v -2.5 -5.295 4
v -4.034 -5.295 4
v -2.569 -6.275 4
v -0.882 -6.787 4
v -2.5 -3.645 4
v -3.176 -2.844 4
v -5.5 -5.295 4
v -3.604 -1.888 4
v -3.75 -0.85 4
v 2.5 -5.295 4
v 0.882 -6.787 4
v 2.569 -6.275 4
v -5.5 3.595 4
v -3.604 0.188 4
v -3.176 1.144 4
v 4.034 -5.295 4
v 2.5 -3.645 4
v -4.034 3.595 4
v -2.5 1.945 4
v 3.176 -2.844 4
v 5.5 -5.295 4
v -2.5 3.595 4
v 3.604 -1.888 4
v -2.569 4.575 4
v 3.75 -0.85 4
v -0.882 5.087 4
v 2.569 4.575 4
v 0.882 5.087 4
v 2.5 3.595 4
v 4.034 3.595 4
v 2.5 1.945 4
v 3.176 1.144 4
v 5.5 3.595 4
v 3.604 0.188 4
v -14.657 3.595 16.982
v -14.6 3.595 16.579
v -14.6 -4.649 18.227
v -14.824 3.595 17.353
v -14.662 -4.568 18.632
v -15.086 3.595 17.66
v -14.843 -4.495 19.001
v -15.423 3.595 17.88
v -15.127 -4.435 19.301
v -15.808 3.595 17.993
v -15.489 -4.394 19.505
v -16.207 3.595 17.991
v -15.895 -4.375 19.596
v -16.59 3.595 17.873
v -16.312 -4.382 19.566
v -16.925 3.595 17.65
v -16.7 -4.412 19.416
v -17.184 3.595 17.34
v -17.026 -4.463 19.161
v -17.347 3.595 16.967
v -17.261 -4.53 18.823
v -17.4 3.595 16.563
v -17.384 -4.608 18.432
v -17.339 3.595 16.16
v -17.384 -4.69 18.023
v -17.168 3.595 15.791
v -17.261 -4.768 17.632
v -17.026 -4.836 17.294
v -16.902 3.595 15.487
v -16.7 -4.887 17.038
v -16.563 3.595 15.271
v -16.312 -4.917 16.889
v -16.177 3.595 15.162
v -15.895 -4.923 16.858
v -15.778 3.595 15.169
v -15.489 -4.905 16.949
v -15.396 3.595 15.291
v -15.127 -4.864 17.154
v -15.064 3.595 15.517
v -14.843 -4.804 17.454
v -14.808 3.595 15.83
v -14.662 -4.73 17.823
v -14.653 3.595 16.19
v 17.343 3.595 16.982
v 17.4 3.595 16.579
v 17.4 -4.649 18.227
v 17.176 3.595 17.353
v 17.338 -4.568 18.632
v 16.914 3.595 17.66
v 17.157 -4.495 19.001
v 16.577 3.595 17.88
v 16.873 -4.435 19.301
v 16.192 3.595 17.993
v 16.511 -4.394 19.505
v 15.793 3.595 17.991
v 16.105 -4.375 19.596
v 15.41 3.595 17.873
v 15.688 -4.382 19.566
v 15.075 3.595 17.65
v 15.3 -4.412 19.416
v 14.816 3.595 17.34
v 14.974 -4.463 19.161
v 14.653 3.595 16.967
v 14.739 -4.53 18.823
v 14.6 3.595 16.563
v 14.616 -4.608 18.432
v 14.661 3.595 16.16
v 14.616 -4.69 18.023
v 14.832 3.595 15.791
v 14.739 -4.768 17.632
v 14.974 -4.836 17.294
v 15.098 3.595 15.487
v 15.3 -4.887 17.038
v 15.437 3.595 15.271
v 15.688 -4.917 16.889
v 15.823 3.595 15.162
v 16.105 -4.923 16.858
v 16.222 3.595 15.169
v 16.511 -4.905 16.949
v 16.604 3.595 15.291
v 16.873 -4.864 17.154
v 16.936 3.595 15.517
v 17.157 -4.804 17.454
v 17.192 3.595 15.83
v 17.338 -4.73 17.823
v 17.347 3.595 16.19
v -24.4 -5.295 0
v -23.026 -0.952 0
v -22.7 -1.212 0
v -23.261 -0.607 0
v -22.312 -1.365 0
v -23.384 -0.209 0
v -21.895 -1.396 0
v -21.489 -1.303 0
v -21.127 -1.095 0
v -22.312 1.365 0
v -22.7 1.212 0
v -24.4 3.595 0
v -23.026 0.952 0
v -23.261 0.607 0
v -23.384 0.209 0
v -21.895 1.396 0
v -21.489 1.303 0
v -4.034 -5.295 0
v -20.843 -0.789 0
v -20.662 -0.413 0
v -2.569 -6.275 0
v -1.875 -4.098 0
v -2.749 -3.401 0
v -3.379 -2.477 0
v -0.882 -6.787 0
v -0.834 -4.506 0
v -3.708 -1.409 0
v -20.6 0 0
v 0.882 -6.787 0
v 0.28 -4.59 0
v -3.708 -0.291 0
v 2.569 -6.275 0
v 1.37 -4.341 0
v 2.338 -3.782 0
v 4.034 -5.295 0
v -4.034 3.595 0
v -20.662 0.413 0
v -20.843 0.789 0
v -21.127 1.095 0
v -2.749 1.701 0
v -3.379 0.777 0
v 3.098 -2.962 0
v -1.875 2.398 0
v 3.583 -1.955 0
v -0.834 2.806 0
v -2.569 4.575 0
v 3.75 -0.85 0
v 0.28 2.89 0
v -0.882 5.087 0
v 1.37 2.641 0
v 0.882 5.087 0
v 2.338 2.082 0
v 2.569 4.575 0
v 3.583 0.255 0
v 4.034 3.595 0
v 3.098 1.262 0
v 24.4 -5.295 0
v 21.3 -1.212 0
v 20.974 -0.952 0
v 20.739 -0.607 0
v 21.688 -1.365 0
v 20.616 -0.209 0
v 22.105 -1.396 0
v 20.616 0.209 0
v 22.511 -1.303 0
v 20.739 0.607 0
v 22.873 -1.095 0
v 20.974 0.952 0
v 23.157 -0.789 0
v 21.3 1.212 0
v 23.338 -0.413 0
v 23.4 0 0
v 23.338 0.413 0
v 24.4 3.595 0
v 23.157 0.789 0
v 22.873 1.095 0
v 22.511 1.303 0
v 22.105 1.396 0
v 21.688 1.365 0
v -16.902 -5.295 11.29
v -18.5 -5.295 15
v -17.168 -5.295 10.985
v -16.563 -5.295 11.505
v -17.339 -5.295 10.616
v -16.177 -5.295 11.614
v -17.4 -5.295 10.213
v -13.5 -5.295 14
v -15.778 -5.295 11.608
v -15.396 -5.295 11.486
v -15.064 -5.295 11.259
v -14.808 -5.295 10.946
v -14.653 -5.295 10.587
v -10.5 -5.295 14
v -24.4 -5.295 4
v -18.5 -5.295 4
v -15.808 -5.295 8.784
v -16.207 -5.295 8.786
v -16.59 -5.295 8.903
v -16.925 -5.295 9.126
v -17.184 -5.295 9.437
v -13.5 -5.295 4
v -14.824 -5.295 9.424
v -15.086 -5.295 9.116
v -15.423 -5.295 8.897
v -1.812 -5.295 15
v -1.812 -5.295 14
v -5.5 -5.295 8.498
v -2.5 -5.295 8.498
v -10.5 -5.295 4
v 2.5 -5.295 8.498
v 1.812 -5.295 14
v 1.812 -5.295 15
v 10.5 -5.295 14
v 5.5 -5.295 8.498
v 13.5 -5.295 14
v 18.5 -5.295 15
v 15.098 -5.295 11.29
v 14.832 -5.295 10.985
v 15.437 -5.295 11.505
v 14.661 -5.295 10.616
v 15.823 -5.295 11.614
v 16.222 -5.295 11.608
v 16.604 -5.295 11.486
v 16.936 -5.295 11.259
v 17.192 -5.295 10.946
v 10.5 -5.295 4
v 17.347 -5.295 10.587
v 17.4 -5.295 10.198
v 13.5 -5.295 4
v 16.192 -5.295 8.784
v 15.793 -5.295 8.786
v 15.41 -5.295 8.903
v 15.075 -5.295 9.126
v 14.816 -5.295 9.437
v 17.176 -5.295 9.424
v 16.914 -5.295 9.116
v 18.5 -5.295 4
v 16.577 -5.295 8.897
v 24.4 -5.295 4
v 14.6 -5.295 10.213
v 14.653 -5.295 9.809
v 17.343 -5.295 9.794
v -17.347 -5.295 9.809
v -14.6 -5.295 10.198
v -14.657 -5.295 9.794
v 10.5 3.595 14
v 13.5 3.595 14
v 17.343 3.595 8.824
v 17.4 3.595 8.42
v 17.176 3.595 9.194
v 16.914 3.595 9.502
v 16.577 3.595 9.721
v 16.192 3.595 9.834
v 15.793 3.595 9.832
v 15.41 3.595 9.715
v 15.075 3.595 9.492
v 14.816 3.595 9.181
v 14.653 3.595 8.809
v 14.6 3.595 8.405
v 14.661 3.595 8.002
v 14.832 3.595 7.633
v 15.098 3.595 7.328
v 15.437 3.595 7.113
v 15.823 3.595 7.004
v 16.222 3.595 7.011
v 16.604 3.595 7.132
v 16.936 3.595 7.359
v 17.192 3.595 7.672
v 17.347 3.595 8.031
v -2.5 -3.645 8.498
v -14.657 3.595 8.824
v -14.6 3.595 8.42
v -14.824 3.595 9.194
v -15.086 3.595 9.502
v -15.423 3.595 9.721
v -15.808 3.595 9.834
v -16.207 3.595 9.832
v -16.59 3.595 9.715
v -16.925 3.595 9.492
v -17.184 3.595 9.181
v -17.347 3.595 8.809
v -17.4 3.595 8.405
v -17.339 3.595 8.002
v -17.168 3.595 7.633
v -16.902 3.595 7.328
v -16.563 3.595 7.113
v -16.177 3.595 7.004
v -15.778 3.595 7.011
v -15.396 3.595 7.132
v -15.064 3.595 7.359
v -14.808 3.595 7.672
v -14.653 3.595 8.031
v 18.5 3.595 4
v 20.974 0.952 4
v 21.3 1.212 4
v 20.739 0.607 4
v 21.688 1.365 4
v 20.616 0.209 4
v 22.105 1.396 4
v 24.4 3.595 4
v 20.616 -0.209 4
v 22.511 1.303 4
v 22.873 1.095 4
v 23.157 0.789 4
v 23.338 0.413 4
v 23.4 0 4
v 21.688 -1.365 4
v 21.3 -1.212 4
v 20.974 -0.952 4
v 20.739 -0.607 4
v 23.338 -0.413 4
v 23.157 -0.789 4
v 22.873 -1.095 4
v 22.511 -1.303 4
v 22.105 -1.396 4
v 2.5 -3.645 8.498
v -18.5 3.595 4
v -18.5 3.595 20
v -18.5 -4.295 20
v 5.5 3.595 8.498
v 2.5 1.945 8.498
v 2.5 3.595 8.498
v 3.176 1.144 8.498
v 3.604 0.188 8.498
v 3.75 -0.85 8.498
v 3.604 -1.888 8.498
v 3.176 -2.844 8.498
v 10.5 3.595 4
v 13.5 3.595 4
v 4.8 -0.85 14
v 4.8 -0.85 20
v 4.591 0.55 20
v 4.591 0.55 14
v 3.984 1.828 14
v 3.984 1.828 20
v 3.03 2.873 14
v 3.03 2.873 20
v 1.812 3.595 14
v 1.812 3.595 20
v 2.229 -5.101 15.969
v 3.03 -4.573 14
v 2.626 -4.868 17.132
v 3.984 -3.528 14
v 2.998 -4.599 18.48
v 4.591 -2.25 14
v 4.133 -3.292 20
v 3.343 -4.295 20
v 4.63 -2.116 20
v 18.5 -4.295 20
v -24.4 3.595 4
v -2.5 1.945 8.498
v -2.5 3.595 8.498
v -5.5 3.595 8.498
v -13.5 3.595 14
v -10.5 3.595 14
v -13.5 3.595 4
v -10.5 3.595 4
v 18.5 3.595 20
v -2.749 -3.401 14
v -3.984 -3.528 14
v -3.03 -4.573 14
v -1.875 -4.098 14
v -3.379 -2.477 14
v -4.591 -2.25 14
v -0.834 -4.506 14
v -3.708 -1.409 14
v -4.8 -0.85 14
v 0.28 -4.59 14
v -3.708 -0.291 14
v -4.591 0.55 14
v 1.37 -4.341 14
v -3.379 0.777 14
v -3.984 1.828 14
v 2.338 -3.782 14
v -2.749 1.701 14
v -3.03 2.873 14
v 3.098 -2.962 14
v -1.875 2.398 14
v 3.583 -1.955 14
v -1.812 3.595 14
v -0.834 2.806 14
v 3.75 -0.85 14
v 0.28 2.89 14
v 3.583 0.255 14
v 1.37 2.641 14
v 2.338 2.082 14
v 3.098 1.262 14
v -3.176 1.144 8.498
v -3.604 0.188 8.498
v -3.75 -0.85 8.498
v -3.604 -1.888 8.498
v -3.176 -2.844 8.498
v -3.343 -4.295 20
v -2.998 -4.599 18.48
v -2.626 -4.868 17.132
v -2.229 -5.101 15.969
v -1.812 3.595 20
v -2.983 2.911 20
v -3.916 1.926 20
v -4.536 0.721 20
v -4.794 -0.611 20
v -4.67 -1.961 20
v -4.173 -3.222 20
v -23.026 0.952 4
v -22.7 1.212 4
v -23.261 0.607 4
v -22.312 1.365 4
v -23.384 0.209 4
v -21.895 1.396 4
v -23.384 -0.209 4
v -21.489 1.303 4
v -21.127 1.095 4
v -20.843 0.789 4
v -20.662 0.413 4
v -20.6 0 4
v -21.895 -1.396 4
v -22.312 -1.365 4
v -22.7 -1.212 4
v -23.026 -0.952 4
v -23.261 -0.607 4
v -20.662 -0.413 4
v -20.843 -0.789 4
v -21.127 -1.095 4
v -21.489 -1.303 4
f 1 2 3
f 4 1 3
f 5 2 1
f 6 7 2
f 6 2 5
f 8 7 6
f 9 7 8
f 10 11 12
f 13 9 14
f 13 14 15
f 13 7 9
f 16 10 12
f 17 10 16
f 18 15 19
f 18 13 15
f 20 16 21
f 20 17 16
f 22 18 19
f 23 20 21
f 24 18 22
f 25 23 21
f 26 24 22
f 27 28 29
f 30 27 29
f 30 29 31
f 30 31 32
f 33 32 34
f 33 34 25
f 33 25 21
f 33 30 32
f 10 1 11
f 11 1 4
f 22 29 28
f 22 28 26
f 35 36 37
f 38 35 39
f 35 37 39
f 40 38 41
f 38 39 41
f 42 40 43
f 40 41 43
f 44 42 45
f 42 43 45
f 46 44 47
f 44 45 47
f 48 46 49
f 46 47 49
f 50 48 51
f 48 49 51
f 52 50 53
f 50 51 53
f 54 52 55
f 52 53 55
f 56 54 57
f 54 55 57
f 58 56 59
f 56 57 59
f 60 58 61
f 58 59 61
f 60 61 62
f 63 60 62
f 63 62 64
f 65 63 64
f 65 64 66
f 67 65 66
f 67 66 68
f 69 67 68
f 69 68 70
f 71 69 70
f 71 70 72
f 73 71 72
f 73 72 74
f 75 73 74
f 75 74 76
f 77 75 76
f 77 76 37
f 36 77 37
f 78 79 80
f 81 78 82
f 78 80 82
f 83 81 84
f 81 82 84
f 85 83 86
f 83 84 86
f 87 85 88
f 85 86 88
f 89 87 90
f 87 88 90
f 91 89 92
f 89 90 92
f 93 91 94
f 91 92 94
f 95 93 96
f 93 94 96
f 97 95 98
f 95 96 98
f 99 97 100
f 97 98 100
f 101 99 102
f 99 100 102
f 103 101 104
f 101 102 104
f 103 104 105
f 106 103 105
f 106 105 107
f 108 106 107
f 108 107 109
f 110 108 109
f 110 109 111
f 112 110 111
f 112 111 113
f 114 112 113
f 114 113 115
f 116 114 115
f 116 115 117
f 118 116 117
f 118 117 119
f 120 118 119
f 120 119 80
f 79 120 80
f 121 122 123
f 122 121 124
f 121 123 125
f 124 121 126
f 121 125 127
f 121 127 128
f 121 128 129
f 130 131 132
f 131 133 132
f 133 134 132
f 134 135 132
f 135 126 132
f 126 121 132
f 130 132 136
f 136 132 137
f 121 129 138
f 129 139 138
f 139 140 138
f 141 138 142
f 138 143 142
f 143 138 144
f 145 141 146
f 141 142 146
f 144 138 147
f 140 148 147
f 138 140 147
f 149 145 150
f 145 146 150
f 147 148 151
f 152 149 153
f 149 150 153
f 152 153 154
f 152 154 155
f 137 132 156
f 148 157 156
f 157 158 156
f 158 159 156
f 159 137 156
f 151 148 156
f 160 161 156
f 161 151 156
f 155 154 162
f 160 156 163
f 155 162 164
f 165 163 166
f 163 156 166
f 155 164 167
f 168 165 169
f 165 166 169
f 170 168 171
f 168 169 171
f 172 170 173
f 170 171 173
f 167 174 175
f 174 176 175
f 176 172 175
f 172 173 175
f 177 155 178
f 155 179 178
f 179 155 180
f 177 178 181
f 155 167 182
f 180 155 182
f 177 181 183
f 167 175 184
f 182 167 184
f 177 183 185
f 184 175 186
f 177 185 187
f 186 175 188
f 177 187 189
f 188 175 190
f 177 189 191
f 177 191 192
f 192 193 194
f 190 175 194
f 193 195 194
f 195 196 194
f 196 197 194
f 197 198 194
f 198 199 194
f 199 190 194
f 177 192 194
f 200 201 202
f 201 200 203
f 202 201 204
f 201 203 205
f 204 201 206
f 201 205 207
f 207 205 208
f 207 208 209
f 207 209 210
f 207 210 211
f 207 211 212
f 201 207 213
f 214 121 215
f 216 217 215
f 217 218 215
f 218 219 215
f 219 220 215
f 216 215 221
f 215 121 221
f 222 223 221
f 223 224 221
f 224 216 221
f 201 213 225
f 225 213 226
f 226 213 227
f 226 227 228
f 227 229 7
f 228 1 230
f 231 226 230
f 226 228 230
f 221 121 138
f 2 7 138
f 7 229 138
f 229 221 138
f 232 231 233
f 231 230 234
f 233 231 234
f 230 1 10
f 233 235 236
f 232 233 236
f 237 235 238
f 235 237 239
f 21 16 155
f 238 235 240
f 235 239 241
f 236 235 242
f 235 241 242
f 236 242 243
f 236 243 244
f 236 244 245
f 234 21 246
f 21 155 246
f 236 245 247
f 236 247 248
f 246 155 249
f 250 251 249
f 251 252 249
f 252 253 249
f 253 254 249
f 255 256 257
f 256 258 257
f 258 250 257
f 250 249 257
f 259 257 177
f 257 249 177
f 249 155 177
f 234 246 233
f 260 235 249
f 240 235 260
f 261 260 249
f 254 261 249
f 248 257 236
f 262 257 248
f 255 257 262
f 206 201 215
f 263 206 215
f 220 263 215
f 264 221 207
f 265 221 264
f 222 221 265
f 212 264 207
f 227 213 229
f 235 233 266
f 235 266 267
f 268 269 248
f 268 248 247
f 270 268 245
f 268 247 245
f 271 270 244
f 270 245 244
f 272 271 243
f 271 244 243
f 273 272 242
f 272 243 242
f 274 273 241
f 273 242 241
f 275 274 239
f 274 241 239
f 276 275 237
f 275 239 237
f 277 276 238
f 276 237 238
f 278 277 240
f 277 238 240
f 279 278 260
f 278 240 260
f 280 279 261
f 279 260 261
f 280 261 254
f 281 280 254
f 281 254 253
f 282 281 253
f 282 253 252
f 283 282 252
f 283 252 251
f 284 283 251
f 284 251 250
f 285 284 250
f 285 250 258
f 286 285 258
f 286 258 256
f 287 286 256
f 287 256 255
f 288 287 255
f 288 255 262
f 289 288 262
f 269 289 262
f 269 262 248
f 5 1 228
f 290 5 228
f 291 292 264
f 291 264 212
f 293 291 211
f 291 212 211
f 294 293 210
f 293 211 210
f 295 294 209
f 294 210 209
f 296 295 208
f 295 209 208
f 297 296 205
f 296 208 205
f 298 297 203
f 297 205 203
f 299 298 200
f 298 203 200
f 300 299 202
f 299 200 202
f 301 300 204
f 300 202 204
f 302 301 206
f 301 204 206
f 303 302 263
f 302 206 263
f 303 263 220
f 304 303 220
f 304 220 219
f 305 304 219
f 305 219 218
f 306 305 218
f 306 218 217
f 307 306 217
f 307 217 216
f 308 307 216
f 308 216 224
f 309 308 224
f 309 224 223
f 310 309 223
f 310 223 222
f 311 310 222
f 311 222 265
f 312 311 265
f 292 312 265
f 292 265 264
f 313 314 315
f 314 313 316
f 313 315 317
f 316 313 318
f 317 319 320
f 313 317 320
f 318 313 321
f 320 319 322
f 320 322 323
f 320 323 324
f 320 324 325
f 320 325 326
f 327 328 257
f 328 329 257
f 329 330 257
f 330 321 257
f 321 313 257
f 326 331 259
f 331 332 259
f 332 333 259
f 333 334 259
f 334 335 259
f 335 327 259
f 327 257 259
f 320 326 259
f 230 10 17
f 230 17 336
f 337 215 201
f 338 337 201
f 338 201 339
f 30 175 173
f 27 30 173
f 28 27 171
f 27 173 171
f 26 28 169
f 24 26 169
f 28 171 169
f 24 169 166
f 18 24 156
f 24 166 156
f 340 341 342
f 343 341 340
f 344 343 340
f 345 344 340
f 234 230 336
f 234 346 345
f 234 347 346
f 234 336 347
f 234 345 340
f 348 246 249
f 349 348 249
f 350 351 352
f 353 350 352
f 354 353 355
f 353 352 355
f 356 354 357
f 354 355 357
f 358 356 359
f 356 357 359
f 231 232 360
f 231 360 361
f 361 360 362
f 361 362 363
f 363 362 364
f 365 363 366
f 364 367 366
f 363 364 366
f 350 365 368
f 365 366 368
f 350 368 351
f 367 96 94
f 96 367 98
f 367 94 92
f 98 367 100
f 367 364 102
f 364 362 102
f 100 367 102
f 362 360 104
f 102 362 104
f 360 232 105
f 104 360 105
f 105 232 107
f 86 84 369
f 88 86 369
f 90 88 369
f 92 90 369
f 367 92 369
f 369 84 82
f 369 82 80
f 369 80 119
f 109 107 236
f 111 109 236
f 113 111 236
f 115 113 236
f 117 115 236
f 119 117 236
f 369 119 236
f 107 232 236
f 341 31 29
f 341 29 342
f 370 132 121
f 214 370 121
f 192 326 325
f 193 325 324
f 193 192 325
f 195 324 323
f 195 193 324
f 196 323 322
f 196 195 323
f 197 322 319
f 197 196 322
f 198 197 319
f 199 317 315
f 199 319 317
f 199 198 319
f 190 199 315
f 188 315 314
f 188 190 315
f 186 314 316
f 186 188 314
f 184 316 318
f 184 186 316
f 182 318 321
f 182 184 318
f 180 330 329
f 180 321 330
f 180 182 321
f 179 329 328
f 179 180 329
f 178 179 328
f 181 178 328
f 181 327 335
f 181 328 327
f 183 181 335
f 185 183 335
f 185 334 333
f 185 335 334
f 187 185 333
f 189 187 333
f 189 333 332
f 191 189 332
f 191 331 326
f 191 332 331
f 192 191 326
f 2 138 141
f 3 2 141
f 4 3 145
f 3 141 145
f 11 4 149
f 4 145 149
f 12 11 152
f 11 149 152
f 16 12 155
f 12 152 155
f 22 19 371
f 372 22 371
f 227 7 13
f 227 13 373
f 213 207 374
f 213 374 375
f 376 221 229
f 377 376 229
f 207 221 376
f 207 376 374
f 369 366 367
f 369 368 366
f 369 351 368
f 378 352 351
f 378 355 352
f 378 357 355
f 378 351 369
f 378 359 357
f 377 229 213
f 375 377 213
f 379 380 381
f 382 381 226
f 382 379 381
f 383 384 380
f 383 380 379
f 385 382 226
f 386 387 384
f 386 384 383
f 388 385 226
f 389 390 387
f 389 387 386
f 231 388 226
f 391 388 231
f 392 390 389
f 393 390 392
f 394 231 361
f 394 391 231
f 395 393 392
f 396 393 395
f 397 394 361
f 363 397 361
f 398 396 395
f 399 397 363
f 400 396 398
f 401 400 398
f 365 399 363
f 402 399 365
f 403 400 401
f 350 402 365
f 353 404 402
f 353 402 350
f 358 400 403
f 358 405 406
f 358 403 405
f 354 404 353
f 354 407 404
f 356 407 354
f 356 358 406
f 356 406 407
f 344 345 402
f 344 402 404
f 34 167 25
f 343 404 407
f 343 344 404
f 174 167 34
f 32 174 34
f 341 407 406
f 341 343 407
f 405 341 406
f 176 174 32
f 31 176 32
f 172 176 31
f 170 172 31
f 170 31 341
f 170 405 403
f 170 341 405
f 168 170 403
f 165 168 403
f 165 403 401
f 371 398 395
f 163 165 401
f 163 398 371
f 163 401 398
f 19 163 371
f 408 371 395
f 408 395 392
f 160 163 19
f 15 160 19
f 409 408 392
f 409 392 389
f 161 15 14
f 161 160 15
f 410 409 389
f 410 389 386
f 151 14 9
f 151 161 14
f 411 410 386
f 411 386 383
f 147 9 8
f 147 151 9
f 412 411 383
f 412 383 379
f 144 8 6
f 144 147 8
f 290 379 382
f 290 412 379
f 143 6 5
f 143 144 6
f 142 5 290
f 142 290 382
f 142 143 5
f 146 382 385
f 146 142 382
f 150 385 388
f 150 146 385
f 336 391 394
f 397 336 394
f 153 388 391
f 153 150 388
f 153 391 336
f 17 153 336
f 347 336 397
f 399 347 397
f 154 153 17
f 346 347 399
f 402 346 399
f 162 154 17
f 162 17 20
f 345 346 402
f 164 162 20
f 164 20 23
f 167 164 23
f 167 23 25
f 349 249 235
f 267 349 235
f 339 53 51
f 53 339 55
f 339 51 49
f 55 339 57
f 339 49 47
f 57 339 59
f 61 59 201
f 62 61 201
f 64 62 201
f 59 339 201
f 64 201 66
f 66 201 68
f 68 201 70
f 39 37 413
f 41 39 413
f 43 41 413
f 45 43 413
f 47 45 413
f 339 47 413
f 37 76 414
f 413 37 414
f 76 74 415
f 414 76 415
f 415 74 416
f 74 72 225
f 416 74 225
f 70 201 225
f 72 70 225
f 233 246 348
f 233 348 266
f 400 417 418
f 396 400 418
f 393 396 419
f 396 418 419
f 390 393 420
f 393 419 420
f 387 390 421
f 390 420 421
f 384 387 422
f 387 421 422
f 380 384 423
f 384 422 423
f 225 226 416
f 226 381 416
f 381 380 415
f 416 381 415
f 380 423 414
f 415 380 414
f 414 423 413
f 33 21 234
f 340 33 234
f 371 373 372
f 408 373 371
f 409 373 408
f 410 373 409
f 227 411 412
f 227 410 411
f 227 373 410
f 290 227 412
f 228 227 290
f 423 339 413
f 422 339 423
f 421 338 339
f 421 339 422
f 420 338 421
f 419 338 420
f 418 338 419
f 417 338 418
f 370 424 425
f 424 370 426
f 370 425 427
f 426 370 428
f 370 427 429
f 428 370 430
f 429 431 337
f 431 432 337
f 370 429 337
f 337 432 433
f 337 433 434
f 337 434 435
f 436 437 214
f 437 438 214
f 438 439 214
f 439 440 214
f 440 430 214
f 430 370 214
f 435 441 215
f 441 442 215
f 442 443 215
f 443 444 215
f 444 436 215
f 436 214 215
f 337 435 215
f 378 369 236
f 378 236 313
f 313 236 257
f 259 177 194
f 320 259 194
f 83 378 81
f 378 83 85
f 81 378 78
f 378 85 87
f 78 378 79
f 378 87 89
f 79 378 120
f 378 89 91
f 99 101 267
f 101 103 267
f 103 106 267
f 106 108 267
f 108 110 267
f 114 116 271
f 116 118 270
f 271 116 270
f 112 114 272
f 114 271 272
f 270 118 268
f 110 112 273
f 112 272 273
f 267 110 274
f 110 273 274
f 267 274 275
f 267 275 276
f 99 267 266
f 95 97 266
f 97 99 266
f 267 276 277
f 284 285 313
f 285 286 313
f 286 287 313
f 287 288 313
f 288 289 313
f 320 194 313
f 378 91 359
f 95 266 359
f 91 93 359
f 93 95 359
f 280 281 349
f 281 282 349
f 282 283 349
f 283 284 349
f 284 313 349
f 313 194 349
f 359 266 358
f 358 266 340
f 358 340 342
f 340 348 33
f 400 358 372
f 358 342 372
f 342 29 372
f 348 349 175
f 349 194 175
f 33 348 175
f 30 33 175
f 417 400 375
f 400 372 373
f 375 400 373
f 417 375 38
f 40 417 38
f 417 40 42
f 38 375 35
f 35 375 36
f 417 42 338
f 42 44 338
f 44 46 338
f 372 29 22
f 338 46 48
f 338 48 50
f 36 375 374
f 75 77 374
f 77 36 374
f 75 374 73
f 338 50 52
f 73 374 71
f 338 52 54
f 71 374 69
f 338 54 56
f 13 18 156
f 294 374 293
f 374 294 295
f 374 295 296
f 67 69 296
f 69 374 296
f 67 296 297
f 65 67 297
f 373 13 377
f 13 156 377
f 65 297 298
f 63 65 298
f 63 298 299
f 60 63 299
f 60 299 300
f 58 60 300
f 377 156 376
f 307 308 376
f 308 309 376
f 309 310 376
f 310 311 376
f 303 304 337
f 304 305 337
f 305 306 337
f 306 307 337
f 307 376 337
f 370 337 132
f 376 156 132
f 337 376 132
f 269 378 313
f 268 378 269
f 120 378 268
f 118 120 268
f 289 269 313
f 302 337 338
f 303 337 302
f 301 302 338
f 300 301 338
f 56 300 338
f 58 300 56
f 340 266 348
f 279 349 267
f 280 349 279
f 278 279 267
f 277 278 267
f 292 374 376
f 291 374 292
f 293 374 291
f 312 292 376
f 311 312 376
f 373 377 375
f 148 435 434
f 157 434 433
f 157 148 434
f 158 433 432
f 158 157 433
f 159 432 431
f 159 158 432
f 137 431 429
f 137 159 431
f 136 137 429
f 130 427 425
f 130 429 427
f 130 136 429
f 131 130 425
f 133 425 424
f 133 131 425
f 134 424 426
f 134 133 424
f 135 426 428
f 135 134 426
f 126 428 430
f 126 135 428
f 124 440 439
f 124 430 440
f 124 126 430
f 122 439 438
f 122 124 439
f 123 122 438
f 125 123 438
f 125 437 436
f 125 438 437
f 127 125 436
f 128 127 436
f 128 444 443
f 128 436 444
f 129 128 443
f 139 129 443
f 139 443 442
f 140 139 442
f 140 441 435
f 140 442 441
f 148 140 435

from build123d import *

# Parameters (mm, degrees)
F0_R       = 1.4
F0_R_2     = 3.75
F1_DEPTH   = 20
F2_R       = 3.75
F3_DEPTH   = 6
F4_SIZE2   = 5
F4_SIZE    = 1
F4_2_SIZE2 = 5
F4_2_SIZE  = 1
F5_R       = 1.4
F6_DEPTH   = 25
F7_W       = 3
F7_H       = 10
F7_H_2     = 4.4981769323
F7_W_2     = 5.9
F7_H_3     = 5
F8_DEPTH   = 25
F9_DEPTH   = 4


with BuildPart() as f1:
    # F0 (on Top) → F1 (new body)
    with BuildSketch(Plane.XY):
        Polygon((-4.034158995, 3.5947567205), (-24.4, 3.5947567205), (-24.4, -5.2947567205), (-4.034158995, -5.2947567205), (4.034158995, -5.2947567205), (24.4, -5.2947567205), (24.4, 3.5947567205), (4.034158995, 3.5947567205), align=None)
        with Locations((-22, 0)):
            Circle(F0_R, mode=Mode.SUBTRACT)
        with Locations((0, -0.85)):
            Circle(F0_R_2, mode=Mode.SUBTRACT)
        with Locations((22, 0)):
            Circle(F0_R, mode=Mode.SUBTRACT)
    extrude(amount=F1_DEPTH)

    # F2 (on face) → F3 (cut)
    with BuildSketch(Plane.XY.offset(20)):
        with BuildLine():
            ThreePointArc((1.8122189976, -5.2947567205), (3.9836322112, -3.5278114955), (4.8, -0.85))
            ThreePointArc((4.8, -0.85), (3.9836322112, 1.8278114955), (1.8122189976, 3.5947567205))
            Line((1.8122189976, 3.5947567205), (-1.8122189976, 3.5947567205))
            ThreePointArc((-1.8122189976, 3.5947567205), (-4.8, -0.85), (-1.8122189976, -5.2947567205))
            Line((-1.8122189976, -5.2947567205), (1.8122189976, -5.2947567205))
        make_face()
        with Locations((0, -0.85)):
            Circle(F2_R, mode=Mode.SUBTRACT)
        with BuildLine():
            Line((-1.8122189976, 3.5947567205), (1.8122189976, 3.5947567205))
            ThreePointArc((1.8122189976, 3.5947567205), (0, 3.95), (-1.8122189976, 3.5947567205))
        make_face()
        with BuildLine():
            ThreePointArc((-1.8122189976, -5.2947567205), (0, -5.65), (1.8122189976, -5.2947567205))
            Line((1.8122189976, -5.2947567205), (-1.8122189976, -5.2947567205))
        make_face()
    extrude(amount=-F3_DEPTH, mode=Mode.SUBTRACT)

    # F4
    f4_edges = [f1.edges().sort_by_distance(p)[0] for p in [
        (-13.106109, -5.294757, 20),
    ]]
    f4_side = f1.faces().sort_by_distance((-13.89592, -0.879836, 20))[0]
    chamfer(f4_edges, length=F4_SIZE, length2=F4_SIZE2, reference=f4_side)

    # F4#2
    f4_2_edges = [f1.edges().sort_by_distance(p)[0] for p in [
        (13.106109, -5.294757, 20),
    ]]
    f4_2_side = f1.faces().sort_by_distance((13.89592, -0.879836, 20))[0]
    chamfer(f4_2_edges, length=F4_2_SIZE, length2=F4_2_SIZE2, reference=f4_2_side)

    # F5 (on face) → F6 (cut)
    with BuildSketch(Plane(origin=(0, -7.9757276159, 1.5951455232), x_dir=(1, 0, 0), z_dir=(0, -0.9805806757, 0.1961161351))):
        with Locations((-16, 16.9616127755)):
            Circle(F5_R)
        with Locations((16, 16.9616127755)):
            Circle(F5_R)
        with Locations((-16, 8.9616127755)):
            Circle(F5_R)
        with Locations((16, 8.9616127755)):
            Circle(F5_R)
    extrude(amount=-F6_DEPTH, mode=Mode.SUBTRACT)

    # F7 (on face) → F8 (cut)
    with BuildSketch(Plane.XZ.offset(5.2947567205)):
        with Locations((-20, 9)):
            Rectangle(F7_W, F7_H)
        with Locations((-4, 6.2490884662)):
            Rectangle(F7_W, F7_H_2)
        with Locations((4, 6.2490884662)):
            Rectangle(F7_W, F7_H_2)
        with Locations((12, 9)):
            Rectangle(F7_W, F7_H)
        with Locations((20, 9)):
            Rectangle(F7_W, F7_H)
        Polygon((-21.5, 4), (-21.5, 14), (-18.5, 14), (-18.5, 15), (-24.4, 15), (-24.4, 4), align=None)
        with Locations((-21.45, 17.5)):
            Rectangle(F7_W_2, F7_H_3)
        with Locations((21.45, 17.5)):
            Rectangle(F7_W_2, F7_H_3)
        Polygon((21.5, 4), (24.4, 4), (24.4, 15), (18.5, 15), (18.5, 14), (21.5, 14), align=None)
        with Locations((-12, 9)):
            Rectangle(F7_W, F7_H)
    extrude(amount=-F8_DEPTH, mode=Mode.SUBTRACT)

    # F0 (on Top) → F9 (join)
    with BuildSketch(Plane.XY):
        with BuildLine():
            Line((4.034158995, -5.2947567205), (-4.034158995, -5.2947567205))
            ThreePointArc((-4.034158995, -5.2947567205), (0, -6.8525245607), (4.034158995, -5.2947567205))
        make_face()
        with BuildLine():
            ThreePointArc((4.034158995, 3.5947567205), (0, 5.1525245607), (-4.034158995, 3.5947567205))
            Line((-4.034158995, 3.5947567205), (4.034158995, 3.5947567205))
        make_face()
    extrude(amount=F9_DEPTH)


solid = f1.part
